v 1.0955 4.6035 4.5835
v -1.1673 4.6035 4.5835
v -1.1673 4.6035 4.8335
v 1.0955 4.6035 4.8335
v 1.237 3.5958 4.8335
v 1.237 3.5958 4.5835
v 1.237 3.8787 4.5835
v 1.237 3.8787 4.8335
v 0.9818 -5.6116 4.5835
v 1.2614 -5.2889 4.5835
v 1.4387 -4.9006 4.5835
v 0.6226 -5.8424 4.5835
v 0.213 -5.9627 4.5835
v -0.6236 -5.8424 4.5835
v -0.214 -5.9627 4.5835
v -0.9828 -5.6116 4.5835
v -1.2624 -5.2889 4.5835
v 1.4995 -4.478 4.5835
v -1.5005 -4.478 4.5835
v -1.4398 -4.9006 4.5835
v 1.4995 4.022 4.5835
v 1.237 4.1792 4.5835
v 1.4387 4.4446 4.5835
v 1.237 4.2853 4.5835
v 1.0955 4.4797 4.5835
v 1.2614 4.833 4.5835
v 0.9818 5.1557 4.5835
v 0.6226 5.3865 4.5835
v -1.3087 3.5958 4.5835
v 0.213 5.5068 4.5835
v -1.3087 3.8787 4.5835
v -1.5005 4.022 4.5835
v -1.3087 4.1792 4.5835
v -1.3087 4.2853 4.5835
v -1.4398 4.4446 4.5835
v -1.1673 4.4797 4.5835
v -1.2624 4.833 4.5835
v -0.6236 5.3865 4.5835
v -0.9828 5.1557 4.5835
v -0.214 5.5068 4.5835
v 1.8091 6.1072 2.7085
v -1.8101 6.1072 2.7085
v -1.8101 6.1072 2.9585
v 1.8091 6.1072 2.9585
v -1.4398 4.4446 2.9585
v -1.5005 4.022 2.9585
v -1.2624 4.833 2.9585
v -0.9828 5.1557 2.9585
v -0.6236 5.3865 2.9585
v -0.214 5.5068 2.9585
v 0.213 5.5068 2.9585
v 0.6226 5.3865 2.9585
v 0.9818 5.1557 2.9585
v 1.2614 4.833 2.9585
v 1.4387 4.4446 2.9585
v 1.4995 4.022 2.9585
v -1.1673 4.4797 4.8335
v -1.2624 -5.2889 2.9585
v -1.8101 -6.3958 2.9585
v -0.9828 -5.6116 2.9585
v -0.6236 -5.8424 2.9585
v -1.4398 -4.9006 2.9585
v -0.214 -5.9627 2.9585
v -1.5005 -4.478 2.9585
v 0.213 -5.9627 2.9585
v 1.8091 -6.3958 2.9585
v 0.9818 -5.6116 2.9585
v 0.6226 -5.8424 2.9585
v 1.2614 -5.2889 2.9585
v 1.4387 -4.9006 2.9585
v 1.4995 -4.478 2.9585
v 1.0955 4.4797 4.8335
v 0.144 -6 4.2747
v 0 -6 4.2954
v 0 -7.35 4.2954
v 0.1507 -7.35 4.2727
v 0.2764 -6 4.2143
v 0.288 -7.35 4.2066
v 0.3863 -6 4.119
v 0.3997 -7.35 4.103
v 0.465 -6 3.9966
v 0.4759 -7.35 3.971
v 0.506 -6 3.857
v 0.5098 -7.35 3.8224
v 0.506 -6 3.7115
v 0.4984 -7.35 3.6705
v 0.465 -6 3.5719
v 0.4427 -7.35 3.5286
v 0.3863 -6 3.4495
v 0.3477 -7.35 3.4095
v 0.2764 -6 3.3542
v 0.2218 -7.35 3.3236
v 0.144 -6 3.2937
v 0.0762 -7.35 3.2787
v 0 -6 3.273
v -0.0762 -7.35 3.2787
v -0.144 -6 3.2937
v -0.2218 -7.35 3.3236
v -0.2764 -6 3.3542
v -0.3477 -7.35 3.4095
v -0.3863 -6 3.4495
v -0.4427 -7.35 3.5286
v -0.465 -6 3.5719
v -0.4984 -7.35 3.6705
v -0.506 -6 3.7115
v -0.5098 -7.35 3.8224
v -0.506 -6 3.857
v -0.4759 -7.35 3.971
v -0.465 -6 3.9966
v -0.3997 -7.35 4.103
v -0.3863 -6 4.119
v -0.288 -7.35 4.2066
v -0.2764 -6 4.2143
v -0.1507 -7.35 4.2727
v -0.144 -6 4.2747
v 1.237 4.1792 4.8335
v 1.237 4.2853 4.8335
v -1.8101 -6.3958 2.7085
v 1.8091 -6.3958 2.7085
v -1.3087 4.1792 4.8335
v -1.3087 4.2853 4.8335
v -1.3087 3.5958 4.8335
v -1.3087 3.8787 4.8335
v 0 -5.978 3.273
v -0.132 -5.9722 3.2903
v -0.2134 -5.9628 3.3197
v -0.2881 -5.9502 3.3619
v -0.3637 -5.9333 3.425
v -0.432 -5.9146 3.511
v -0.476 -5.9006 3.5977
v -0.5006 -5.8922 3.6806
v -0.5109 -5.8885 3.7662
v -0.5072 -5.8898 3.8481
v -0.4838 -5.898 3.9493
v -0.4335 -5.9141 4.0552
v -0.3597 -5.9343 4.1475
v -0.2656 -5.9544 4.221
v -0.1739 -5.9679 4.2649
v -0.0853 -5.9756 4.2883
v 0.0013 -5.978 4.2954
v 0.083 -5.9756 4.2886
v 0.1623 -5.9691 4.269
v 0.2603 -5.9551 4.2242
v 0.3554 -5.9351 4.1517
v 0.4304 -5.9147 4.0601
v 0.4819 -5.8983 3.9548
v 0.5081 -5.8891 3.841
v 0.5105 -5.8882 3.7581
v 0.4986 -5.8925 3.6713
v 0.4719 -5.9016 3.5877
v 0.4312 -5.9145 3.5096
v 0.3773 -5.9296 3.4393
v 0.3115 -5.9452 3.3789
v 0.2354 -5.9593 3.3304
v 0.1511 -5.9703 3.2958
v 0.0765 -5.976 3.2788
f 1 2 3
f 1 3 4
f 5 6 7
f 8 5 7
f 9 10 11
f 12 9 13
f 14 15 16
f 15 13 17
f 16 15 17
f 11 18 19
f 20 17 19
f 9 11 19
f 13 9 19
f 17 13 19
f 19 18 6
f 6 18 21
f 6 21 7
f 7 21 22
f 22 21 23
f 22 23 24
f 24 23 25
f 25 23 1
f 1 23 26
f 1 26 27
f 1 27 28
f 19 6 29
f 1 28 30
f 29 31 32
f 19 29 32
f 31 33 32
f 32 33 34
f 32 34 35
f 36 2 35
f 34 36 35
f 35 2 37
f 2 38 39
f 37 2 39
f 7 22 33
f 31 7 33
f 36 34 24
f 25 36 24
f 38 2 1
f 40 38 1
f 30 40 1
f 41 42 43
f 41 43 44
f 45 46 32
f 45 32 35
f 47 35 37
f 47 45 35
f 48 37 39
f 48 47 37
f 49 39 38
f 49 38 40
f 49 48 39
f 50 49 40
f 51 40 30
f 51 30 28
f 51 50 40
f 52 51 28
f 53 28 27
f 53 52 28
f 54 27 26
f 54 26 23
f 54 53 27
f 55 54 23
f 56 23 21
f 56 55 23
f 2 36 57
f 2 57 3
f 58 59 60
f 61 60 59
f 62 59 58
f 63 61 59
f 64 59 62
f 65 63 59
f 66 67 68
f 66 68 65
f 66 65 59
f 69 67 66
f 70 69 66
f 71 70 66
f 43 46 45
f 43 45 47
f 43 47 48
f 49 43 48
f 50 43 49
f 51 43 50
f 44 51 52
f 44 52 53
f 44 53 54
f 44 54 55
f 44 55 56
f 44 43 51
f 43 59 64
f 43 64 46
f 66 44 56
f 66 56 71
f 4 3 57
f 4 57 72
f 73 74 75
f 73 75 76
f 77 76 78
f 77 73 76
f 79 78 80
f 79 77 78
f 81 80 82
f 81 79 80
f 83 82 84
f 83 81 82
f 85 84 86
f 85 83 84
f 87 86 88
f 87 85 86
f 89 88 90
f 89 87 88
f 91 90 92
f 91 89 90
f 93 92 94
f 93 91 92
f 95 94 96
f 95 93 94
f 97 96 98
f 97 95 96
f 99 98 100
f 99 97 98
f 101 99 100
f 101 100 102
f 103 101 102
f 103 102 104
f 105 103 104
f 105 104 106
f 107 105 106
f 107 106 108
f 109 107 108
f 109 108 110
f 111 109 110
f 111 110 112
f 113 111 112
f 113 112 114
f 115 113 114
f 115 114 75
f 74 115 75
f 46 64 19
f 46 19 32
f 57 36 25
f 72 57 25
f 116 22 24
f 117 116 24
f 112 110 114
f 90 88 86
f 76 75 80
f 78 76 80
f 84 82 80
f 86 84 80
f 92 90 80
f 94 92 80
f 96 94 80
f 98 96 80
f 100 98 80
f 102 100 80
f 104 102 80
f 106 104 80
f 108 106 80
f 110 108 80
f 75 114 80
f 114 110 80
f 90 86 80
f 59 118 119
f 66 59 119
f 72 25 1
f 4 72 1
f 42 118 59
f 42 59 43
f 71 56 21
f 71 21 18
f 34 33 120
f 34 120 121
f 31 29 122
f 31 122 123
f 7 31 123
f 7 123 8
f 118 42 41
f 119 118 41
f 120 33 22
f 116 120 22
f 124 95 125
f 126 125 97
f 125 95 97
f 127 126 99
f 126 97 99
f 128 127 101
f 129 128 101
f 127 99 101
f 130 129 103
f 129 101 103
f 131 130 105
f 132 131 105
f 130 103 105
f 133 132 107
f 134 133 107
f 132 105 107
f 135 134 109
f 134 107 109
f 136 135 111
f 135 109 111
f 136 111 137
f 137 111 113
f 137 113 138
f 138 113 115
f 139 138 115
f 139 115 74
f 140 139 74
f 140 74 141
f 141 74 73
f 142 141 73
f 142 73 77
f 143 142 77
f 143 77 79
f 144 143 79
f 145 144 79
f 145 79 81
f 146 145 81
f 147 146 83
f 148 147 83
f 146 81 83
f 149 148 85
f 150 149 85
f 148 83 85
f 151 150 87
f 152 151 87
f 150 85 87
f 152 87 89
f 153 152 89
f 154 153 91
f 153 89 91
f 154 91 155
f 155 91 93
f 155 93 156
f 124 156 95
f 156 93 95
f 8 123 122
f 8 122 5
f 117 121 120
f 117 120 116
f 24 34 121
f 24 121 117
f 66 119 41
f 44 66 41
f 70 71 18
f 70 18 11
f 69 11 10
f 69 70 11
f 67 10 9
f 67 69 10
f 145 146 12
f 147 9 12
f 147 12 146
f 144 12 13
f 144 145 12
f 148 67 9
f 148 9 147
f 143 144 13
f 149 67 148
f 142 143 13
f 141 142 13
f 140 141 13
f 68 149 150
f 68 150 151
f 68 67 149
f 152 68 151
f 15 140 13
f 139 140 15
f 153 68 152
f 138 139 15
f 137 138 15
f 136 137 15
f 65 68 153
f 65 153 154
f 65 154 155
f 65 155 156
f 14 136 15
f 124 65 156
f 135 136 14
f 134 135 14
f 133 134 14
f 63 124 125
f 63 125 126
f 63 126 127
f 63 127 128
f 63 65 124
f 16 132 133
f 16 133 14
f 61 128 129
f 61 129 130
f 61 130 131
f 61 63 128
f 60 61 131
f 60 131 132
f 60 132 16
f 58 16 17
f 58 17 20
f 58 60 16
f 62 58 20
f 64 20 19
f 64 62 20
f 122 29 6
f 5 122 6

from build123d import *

# Parameters (mm, degrees)
SKETCH1_W           = 14.477015864
SKETCH1_H           = 50.012098532
BOSS_EXTRUDE1_DEPTH = 1
BOSS_EXTRUDE2_DEPTH = 6.5
SKETCH4_W           = 9.051394426
SKETCH4_H           = 0.494998133
SKETCH4_W_2         = 10.182818728
SKETCH4_H_2         = 0.424284113
SKETCH4_H_3         = 1.131424304
BOSS_EXTRUDE4_DEPTH = 1
SCALE1_SCALE        = 0.5
SCALE2_SCALE        = 0.5
SKETCH5_R           = 0.511212816
BOSS_EXTRUDE5_DEPTH = 1.35
SKETCH7_R           = 0.511212816
BOSS_EXTRUDE6_DEPTH = 1.35


with BuildPart() as part:
    # Sketch1 → Boss-Extrude1 (new body)
    with BuildSketch(Plane.XY):
        Rectangle(SKETCH1_W, SKETCH1_H)
    extrude(amount=BOSS_EXTRUDE1_DEPTH)

    # Sketch2 → Boss-Extrude2 (add)
    with BuildSketch(Plane.XY.offset(1)):
        with BuildLine():
            Line((6, 16.665360906), (6, -17.334639094))
            ThreePointArc((6, -17.334639094), (0, -23.334639094), (-6, -17.334639094))
            Line((-6, -17.334639094), (-6, 16.665360906))
            ThreePointArc((-6, 16.665360906), (0, 22.665360906), (6, 16.665360906))
        make_face()
    extrude(amount=BOSS_EXTRUDE2_DEPTH)

    # Sketch4 → Boss-Extrude4 (add)
    with BuildSketch(Plane.XY.offset(7.5)):
        with Locations((-0.141428038, 18.743662091)):
            Rectangle(SKETCH4_W, SKETCH4_H)
        with Locations((-0.141428038, 17.506166759)):
            Rectangle(SKETCH4_W_2, SKETCH4_H_2)
        with Locations((-0.141428038, 15.526174228)):
            Rectangle(SKETCH4_W_2, SKETCH4_H_3)
    extrude(amount=BOSS_EXTRUDE4_DEPTH)


with BuildPart() as part_1:
    # Scale1: scaled about (-0.000695656, -0.192418976, 3.611272537)
    add(part.part.scale(SCALE1_SCALE).moved(Location((-0.000347828, -0.096209488, 1.805636269))))


with BuildPart() as part_2:
    # Scale2: scaled about (-0.000695656, -0.192418976, 3.611272537)
    add(part_1.part.scale(SCALE2_SCALE).moved(Location((-0.000347828, -0.096209488, 1.805636269))))



with BuildPart() as body_2:
    # Sketch5 → Boss-Extrude5 (new body)
    with BuildSketch(Plane(origin=(0, -6, 0), x_dir=(1, 0, 0), z_dir=(0, 1, 0))):
        with Locations(Location((0, -3.78422441, 0), (0, 0, 270))):
            Circle(SKETCH5_R)
    extrude(amount=-BOSS_EXTRUDE5_DEPTH)


with BuildPart() as part_3:
    add(part_2.part)

    add(body_2.part)  # Boss-Extrude6 merges body 2
    # Sketch7 → Boss-Extrude6 (add)
    with BuildSketch(Plane(origin=(0, -6, 0), x_dir=(1, 0, 0), z_dir=(0, 1, 0))):
        with Locations(Location((0, -3.78422441, 0), (0, 0, 90))):
            Circle(SKETCH7_R)
    extrude(amount=BOSS_EXTRUDE6_DEPTH)


solid = part_3.part
